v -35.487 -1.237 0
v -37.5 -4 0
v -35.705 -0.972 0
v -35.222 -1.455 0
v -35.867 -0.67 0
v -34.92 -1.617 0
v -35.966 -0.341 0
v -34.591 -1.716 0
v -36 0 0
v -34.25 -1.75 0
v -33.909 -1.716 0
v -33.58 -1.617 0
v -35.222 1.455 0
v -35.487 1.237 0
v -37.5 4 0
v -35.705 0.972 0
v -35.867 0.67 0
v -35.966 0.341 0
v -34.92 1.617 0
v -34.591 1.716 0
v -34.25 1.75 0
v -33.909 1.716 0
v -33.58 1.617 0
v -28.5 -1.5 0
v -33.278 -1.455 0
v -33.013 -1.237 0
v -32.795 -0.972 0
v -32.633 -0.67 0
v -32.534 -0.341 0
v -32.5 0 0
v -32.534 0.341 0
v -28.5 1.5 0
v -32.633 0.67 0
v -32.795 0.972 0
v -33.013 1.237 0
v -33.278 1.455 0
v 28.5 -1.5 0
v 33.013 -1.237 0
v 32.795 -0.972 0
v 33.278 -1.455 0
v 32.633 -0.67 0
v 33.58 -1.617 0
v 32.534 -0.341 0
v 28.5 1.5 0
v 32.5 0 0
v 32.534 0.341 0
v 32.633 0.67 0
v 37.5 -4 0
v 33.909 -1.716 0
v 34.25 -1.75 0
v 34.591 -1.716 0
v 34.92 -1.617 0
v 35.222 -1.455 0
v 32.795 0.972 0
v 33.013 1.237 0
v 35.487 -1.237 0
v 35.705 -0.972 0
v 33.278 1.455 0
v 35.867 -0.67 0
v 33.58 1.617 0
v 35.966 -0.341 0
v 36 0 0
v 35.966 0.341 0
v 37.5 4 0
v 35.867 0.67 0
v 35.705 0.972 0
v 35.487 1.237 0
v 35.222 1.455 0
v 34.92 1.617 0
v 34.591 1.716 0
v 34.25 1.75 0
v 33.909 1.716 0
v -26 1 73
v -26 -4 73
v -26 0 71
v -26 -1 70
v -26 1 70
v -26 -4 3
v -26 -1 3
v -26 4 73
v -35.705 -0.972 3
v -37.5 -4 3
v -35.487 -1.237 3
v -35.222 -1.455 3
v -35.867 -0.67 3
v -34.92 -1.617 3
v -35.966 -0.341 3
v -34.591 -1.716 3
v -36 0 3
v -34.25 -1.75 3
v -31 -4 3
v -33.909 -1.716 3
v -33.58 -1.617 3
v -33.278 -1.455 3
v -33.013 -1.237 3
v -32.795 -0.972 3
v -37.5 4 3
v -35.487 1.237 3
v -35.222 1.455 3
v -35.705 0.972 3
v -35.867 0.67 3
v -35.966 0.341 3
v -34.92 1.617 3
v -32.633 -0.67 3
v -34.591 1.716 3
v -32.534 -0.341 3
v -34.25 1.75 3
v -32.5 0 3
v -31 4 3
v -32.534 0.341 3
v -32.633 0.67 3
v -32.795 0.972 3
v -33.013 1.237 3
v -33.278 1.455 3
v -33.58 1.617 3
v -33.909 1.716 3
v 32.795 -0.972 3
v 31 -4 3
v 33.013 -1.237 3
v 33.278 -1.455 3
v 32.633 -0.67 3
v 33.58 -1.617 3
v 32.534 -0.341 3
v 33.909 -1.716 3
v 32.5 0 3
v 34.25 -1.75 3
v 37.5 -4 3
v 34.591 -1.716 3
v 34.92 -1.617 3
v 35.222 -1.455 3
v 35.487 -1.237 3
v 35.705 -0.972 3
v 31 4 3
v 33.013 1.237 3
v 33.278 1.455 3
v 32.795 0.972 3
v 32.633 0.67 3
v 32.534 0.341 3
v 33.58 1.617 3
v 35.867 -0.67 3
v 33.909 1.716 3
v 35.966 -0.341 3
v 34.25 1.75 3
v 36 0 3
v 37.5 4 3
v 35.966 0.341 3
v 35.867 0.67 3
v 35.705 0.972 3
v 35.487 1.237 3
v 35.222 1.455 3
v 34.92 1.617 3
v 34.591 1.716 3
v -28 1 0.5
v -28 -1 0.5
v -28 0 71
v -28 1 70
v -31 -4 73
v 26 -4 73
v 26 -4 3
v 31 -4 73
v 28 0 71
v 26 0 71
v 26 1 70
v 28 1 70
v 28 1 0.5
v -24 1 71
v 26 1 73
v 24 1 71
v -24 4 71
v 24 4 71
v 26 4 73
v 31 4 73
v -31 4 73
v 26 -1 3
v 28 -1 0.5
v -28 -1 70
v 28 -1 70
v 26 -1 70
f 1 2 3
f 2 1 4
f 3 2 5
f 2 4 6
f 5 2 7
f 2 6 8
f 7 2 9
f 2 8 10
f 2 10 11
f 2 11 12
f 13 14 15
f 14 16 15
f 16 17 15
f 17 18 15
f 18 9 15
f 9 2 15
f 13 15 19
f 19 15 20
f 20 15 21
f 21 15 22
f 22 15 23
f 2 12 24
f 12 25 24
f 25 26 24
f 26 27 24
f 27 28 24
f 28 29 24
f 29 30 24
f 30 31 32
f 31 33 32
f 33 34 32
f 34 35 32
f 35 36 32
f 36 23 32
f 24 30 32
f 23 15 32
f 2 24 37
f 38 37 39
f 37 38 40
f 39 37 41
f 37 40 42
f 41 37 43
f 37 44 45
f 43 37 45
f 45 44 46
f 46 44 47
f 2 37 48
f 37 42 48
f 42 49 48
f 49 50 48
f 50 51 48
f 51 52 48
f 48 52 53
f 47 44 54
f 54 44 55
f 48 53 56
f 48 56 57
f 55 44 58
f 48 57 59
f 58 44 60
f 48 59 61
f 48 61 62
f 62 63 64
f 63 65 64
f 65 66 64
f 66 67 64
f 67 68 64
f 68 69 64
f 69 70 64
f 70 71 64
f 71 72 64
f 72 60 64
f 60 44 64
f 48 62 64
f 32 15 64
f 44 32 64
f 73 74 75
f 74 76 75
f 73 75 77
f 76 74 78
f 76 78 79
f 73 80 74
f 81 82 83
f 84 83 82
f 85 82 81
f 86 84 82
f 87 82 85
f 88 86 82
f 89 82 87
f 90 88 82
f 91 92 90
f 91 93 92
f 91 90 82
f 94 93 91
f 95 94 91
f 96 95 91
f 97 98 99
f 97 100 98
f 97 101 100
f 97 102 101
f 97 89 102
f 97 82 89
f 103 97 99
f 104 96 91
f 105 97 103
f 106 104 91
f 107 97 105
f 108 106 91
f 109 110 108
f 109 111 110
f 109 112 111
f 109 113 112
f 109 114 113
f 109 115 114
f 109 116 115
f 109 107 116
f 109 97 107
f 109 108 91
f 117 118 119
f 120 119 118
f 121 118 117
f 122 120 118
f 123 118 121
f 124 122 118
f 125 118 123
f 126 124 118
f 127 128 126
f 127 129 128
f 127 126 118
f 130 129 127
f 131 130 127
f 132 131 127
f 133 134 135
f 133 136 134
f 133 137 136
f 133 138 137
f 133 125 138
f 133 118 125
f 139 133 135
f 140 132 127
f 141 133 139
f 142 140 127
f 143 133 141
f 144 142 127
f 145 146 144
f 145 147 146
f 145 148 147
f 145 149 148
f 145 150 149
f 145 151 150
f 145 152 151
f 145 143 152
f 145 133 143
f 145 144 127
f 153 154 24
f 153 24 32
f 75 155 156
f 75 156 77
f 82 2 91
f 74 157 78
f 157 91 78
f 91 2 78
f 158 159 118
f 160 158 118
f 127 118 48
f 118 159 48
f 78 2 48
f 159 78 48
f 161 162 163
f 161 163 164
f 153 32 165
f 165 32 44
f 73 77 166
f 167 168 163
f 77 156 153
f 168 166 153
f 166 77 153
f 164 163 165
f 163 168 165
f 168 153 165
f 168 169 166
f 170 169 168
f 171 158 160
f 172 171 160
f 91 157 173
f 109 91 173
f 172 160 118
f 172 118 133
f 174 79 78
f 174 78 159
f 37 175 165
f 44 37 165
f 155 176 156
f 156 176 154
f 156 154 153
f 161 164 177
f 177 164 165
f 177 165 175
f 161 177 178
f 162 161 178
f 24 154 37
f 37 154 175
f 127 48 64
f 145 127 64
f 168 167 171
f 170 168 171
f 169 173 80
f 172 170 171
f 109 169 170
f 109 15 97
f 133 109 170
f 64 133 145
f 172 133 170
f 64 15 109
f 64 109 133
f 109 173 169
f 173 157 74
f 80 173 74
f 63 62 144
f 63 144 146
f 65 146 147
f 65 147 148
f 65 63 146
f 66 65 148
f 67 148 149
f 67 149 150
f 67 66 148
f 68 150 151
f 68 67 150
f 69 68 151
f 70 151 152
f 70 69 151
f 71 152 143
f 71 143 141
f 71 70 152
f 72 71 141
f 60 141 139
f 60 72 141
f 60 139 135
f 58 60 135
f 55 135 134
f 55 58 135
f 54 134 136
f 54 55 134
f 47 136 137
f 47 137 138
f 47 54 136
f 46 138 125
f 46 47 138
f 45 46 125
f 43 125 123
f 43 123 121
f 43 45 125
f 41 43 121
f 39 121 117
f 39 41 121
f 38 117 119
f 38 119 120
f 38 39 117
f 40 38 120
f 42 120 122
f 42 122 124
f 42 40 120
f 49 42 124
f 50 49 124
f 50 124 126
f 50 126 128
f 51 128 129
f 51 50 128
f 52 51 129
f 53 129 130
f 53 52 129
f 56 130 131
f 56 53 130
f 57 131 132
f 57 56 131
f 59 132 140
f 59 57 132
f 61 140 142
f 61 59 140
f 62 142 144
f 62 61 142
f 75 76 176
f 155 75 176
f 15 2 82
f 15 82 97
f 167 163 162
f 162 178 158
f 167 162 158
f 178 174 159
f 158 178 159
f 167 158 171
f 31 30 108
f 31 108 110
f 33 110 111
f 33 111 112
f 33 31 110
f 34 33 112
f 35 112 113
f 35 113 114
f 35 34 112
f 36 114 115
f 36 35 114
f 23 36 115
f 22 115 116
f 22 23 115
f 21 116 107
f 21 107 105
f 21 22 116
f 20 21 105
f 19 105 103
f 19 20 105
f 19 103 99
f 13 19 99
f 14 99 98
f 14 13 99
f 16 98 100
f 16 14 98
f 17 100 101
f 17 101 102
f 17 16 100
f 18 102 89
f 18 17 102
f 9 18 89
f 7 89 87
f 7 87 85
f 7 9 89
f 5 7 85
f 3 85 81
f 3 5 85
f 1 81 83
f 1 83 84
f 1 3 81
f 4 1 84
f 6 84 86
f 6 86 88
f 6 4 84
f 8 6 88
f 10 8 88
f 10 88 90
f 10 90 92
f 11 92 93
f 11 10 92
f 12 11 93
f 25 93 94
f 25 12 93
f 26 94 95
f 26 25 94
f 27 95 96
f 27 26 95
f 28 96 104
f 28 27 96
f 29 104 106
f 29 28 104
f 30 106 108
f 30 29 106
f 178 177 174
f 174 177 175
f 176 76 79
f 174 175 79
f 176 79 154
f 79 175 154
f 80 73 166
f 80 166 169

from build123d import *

# Parameters (mm, degrees)
F0_W     = 75
F0_H     = 8
F0_R     = 1.75
F0_W_2   = 56
F0_H_2   = 2
F1_DEPTH = 3
F3_DEPTH = 68
F4_W     = 5
F4_H     = 8
F5_DEPTH = 2
F6_SIZE  = 1.99999
F7_SIZE  = 0.99999
F8_SIZE  = 0.5


# Not quite as in the source:
# - a fillet or chamfer is up to 0.001 mm smaller than in the source, because OpenCascade refuses the exact size


with BuildPart() as f1:
    # F0 (on Top) → F1 (new body)
    with BuildSketch(Plane.XY):
        Rectangle(F0_W, F0_H)
        with Locations((-34.25, 0)):
            Circle(F0_R, mode=Mode.SUBTRACT)
        Rectangle(F0_W_2, F0_H_2, mode=Mode.SUBTRACT)
        with Locations((34.25, 0)):
            Circle(F0_R, mode=Mode.SUBTRACT)
    extrude(amount=F1_DEPTH)

    # F2 (on face) → F3 (join)
    with BuildSketch(Plane.XY.offset(3)):
        Polygon((-31, 4), (-31, -4), (-26, -4), (-26, -1), (-28, -1), (-28, 1), (28, 1), (28, -1), (26, -1), (26, -4), (31, -4), (31, 4), align=None)
    extrude(amount=F3_DEPTH)

    # F4 (on face) → F5 (join)
    with BuildSketch(Plane.XY.offset(71)):
        with Locations((-28.5, 0)):
            Rectangle(F4_W, F4_H)
        with Locations((28.5, 0)):
            Rectangle(F4_W, F4_H)
    extrude(amount=F5_DEPTH)

    # F6 (size 2 in the source; OpenCascade refuses exactly that, so slightly less here)
    f6_edges = [f1.edges().sort_by_distance(p)[0] for p in [
        (-26, 2.5, 71),
        (26, 2.5, 71),
    ]]
    chamfer(f6_edges, length=F6_SIZE)

    # F7 (size 1 in the source; OpenCascade refuses exactly that, so slightly less here)
    f7_edges = [f1.edges().sort_by_distance(p)[0] for p in [
        (-27, 1, 71),
        (27, 1, 71),
        (27, -1, 71),
        (-27, -1, 71),
    ]]
    chamfer(f7_edges, length=F7_SIZE)

    # F8
    f8_edges = [f1.edges().sort_by_distance(p)[0] for p in [
        (0, -1, 0),
        (0, 1, 0),
        (-28, 0, 0),
        (28, 0, 0),
    ]]
    chamfer(f8_edges, length=F8_SIZE)


solid = f1.part
